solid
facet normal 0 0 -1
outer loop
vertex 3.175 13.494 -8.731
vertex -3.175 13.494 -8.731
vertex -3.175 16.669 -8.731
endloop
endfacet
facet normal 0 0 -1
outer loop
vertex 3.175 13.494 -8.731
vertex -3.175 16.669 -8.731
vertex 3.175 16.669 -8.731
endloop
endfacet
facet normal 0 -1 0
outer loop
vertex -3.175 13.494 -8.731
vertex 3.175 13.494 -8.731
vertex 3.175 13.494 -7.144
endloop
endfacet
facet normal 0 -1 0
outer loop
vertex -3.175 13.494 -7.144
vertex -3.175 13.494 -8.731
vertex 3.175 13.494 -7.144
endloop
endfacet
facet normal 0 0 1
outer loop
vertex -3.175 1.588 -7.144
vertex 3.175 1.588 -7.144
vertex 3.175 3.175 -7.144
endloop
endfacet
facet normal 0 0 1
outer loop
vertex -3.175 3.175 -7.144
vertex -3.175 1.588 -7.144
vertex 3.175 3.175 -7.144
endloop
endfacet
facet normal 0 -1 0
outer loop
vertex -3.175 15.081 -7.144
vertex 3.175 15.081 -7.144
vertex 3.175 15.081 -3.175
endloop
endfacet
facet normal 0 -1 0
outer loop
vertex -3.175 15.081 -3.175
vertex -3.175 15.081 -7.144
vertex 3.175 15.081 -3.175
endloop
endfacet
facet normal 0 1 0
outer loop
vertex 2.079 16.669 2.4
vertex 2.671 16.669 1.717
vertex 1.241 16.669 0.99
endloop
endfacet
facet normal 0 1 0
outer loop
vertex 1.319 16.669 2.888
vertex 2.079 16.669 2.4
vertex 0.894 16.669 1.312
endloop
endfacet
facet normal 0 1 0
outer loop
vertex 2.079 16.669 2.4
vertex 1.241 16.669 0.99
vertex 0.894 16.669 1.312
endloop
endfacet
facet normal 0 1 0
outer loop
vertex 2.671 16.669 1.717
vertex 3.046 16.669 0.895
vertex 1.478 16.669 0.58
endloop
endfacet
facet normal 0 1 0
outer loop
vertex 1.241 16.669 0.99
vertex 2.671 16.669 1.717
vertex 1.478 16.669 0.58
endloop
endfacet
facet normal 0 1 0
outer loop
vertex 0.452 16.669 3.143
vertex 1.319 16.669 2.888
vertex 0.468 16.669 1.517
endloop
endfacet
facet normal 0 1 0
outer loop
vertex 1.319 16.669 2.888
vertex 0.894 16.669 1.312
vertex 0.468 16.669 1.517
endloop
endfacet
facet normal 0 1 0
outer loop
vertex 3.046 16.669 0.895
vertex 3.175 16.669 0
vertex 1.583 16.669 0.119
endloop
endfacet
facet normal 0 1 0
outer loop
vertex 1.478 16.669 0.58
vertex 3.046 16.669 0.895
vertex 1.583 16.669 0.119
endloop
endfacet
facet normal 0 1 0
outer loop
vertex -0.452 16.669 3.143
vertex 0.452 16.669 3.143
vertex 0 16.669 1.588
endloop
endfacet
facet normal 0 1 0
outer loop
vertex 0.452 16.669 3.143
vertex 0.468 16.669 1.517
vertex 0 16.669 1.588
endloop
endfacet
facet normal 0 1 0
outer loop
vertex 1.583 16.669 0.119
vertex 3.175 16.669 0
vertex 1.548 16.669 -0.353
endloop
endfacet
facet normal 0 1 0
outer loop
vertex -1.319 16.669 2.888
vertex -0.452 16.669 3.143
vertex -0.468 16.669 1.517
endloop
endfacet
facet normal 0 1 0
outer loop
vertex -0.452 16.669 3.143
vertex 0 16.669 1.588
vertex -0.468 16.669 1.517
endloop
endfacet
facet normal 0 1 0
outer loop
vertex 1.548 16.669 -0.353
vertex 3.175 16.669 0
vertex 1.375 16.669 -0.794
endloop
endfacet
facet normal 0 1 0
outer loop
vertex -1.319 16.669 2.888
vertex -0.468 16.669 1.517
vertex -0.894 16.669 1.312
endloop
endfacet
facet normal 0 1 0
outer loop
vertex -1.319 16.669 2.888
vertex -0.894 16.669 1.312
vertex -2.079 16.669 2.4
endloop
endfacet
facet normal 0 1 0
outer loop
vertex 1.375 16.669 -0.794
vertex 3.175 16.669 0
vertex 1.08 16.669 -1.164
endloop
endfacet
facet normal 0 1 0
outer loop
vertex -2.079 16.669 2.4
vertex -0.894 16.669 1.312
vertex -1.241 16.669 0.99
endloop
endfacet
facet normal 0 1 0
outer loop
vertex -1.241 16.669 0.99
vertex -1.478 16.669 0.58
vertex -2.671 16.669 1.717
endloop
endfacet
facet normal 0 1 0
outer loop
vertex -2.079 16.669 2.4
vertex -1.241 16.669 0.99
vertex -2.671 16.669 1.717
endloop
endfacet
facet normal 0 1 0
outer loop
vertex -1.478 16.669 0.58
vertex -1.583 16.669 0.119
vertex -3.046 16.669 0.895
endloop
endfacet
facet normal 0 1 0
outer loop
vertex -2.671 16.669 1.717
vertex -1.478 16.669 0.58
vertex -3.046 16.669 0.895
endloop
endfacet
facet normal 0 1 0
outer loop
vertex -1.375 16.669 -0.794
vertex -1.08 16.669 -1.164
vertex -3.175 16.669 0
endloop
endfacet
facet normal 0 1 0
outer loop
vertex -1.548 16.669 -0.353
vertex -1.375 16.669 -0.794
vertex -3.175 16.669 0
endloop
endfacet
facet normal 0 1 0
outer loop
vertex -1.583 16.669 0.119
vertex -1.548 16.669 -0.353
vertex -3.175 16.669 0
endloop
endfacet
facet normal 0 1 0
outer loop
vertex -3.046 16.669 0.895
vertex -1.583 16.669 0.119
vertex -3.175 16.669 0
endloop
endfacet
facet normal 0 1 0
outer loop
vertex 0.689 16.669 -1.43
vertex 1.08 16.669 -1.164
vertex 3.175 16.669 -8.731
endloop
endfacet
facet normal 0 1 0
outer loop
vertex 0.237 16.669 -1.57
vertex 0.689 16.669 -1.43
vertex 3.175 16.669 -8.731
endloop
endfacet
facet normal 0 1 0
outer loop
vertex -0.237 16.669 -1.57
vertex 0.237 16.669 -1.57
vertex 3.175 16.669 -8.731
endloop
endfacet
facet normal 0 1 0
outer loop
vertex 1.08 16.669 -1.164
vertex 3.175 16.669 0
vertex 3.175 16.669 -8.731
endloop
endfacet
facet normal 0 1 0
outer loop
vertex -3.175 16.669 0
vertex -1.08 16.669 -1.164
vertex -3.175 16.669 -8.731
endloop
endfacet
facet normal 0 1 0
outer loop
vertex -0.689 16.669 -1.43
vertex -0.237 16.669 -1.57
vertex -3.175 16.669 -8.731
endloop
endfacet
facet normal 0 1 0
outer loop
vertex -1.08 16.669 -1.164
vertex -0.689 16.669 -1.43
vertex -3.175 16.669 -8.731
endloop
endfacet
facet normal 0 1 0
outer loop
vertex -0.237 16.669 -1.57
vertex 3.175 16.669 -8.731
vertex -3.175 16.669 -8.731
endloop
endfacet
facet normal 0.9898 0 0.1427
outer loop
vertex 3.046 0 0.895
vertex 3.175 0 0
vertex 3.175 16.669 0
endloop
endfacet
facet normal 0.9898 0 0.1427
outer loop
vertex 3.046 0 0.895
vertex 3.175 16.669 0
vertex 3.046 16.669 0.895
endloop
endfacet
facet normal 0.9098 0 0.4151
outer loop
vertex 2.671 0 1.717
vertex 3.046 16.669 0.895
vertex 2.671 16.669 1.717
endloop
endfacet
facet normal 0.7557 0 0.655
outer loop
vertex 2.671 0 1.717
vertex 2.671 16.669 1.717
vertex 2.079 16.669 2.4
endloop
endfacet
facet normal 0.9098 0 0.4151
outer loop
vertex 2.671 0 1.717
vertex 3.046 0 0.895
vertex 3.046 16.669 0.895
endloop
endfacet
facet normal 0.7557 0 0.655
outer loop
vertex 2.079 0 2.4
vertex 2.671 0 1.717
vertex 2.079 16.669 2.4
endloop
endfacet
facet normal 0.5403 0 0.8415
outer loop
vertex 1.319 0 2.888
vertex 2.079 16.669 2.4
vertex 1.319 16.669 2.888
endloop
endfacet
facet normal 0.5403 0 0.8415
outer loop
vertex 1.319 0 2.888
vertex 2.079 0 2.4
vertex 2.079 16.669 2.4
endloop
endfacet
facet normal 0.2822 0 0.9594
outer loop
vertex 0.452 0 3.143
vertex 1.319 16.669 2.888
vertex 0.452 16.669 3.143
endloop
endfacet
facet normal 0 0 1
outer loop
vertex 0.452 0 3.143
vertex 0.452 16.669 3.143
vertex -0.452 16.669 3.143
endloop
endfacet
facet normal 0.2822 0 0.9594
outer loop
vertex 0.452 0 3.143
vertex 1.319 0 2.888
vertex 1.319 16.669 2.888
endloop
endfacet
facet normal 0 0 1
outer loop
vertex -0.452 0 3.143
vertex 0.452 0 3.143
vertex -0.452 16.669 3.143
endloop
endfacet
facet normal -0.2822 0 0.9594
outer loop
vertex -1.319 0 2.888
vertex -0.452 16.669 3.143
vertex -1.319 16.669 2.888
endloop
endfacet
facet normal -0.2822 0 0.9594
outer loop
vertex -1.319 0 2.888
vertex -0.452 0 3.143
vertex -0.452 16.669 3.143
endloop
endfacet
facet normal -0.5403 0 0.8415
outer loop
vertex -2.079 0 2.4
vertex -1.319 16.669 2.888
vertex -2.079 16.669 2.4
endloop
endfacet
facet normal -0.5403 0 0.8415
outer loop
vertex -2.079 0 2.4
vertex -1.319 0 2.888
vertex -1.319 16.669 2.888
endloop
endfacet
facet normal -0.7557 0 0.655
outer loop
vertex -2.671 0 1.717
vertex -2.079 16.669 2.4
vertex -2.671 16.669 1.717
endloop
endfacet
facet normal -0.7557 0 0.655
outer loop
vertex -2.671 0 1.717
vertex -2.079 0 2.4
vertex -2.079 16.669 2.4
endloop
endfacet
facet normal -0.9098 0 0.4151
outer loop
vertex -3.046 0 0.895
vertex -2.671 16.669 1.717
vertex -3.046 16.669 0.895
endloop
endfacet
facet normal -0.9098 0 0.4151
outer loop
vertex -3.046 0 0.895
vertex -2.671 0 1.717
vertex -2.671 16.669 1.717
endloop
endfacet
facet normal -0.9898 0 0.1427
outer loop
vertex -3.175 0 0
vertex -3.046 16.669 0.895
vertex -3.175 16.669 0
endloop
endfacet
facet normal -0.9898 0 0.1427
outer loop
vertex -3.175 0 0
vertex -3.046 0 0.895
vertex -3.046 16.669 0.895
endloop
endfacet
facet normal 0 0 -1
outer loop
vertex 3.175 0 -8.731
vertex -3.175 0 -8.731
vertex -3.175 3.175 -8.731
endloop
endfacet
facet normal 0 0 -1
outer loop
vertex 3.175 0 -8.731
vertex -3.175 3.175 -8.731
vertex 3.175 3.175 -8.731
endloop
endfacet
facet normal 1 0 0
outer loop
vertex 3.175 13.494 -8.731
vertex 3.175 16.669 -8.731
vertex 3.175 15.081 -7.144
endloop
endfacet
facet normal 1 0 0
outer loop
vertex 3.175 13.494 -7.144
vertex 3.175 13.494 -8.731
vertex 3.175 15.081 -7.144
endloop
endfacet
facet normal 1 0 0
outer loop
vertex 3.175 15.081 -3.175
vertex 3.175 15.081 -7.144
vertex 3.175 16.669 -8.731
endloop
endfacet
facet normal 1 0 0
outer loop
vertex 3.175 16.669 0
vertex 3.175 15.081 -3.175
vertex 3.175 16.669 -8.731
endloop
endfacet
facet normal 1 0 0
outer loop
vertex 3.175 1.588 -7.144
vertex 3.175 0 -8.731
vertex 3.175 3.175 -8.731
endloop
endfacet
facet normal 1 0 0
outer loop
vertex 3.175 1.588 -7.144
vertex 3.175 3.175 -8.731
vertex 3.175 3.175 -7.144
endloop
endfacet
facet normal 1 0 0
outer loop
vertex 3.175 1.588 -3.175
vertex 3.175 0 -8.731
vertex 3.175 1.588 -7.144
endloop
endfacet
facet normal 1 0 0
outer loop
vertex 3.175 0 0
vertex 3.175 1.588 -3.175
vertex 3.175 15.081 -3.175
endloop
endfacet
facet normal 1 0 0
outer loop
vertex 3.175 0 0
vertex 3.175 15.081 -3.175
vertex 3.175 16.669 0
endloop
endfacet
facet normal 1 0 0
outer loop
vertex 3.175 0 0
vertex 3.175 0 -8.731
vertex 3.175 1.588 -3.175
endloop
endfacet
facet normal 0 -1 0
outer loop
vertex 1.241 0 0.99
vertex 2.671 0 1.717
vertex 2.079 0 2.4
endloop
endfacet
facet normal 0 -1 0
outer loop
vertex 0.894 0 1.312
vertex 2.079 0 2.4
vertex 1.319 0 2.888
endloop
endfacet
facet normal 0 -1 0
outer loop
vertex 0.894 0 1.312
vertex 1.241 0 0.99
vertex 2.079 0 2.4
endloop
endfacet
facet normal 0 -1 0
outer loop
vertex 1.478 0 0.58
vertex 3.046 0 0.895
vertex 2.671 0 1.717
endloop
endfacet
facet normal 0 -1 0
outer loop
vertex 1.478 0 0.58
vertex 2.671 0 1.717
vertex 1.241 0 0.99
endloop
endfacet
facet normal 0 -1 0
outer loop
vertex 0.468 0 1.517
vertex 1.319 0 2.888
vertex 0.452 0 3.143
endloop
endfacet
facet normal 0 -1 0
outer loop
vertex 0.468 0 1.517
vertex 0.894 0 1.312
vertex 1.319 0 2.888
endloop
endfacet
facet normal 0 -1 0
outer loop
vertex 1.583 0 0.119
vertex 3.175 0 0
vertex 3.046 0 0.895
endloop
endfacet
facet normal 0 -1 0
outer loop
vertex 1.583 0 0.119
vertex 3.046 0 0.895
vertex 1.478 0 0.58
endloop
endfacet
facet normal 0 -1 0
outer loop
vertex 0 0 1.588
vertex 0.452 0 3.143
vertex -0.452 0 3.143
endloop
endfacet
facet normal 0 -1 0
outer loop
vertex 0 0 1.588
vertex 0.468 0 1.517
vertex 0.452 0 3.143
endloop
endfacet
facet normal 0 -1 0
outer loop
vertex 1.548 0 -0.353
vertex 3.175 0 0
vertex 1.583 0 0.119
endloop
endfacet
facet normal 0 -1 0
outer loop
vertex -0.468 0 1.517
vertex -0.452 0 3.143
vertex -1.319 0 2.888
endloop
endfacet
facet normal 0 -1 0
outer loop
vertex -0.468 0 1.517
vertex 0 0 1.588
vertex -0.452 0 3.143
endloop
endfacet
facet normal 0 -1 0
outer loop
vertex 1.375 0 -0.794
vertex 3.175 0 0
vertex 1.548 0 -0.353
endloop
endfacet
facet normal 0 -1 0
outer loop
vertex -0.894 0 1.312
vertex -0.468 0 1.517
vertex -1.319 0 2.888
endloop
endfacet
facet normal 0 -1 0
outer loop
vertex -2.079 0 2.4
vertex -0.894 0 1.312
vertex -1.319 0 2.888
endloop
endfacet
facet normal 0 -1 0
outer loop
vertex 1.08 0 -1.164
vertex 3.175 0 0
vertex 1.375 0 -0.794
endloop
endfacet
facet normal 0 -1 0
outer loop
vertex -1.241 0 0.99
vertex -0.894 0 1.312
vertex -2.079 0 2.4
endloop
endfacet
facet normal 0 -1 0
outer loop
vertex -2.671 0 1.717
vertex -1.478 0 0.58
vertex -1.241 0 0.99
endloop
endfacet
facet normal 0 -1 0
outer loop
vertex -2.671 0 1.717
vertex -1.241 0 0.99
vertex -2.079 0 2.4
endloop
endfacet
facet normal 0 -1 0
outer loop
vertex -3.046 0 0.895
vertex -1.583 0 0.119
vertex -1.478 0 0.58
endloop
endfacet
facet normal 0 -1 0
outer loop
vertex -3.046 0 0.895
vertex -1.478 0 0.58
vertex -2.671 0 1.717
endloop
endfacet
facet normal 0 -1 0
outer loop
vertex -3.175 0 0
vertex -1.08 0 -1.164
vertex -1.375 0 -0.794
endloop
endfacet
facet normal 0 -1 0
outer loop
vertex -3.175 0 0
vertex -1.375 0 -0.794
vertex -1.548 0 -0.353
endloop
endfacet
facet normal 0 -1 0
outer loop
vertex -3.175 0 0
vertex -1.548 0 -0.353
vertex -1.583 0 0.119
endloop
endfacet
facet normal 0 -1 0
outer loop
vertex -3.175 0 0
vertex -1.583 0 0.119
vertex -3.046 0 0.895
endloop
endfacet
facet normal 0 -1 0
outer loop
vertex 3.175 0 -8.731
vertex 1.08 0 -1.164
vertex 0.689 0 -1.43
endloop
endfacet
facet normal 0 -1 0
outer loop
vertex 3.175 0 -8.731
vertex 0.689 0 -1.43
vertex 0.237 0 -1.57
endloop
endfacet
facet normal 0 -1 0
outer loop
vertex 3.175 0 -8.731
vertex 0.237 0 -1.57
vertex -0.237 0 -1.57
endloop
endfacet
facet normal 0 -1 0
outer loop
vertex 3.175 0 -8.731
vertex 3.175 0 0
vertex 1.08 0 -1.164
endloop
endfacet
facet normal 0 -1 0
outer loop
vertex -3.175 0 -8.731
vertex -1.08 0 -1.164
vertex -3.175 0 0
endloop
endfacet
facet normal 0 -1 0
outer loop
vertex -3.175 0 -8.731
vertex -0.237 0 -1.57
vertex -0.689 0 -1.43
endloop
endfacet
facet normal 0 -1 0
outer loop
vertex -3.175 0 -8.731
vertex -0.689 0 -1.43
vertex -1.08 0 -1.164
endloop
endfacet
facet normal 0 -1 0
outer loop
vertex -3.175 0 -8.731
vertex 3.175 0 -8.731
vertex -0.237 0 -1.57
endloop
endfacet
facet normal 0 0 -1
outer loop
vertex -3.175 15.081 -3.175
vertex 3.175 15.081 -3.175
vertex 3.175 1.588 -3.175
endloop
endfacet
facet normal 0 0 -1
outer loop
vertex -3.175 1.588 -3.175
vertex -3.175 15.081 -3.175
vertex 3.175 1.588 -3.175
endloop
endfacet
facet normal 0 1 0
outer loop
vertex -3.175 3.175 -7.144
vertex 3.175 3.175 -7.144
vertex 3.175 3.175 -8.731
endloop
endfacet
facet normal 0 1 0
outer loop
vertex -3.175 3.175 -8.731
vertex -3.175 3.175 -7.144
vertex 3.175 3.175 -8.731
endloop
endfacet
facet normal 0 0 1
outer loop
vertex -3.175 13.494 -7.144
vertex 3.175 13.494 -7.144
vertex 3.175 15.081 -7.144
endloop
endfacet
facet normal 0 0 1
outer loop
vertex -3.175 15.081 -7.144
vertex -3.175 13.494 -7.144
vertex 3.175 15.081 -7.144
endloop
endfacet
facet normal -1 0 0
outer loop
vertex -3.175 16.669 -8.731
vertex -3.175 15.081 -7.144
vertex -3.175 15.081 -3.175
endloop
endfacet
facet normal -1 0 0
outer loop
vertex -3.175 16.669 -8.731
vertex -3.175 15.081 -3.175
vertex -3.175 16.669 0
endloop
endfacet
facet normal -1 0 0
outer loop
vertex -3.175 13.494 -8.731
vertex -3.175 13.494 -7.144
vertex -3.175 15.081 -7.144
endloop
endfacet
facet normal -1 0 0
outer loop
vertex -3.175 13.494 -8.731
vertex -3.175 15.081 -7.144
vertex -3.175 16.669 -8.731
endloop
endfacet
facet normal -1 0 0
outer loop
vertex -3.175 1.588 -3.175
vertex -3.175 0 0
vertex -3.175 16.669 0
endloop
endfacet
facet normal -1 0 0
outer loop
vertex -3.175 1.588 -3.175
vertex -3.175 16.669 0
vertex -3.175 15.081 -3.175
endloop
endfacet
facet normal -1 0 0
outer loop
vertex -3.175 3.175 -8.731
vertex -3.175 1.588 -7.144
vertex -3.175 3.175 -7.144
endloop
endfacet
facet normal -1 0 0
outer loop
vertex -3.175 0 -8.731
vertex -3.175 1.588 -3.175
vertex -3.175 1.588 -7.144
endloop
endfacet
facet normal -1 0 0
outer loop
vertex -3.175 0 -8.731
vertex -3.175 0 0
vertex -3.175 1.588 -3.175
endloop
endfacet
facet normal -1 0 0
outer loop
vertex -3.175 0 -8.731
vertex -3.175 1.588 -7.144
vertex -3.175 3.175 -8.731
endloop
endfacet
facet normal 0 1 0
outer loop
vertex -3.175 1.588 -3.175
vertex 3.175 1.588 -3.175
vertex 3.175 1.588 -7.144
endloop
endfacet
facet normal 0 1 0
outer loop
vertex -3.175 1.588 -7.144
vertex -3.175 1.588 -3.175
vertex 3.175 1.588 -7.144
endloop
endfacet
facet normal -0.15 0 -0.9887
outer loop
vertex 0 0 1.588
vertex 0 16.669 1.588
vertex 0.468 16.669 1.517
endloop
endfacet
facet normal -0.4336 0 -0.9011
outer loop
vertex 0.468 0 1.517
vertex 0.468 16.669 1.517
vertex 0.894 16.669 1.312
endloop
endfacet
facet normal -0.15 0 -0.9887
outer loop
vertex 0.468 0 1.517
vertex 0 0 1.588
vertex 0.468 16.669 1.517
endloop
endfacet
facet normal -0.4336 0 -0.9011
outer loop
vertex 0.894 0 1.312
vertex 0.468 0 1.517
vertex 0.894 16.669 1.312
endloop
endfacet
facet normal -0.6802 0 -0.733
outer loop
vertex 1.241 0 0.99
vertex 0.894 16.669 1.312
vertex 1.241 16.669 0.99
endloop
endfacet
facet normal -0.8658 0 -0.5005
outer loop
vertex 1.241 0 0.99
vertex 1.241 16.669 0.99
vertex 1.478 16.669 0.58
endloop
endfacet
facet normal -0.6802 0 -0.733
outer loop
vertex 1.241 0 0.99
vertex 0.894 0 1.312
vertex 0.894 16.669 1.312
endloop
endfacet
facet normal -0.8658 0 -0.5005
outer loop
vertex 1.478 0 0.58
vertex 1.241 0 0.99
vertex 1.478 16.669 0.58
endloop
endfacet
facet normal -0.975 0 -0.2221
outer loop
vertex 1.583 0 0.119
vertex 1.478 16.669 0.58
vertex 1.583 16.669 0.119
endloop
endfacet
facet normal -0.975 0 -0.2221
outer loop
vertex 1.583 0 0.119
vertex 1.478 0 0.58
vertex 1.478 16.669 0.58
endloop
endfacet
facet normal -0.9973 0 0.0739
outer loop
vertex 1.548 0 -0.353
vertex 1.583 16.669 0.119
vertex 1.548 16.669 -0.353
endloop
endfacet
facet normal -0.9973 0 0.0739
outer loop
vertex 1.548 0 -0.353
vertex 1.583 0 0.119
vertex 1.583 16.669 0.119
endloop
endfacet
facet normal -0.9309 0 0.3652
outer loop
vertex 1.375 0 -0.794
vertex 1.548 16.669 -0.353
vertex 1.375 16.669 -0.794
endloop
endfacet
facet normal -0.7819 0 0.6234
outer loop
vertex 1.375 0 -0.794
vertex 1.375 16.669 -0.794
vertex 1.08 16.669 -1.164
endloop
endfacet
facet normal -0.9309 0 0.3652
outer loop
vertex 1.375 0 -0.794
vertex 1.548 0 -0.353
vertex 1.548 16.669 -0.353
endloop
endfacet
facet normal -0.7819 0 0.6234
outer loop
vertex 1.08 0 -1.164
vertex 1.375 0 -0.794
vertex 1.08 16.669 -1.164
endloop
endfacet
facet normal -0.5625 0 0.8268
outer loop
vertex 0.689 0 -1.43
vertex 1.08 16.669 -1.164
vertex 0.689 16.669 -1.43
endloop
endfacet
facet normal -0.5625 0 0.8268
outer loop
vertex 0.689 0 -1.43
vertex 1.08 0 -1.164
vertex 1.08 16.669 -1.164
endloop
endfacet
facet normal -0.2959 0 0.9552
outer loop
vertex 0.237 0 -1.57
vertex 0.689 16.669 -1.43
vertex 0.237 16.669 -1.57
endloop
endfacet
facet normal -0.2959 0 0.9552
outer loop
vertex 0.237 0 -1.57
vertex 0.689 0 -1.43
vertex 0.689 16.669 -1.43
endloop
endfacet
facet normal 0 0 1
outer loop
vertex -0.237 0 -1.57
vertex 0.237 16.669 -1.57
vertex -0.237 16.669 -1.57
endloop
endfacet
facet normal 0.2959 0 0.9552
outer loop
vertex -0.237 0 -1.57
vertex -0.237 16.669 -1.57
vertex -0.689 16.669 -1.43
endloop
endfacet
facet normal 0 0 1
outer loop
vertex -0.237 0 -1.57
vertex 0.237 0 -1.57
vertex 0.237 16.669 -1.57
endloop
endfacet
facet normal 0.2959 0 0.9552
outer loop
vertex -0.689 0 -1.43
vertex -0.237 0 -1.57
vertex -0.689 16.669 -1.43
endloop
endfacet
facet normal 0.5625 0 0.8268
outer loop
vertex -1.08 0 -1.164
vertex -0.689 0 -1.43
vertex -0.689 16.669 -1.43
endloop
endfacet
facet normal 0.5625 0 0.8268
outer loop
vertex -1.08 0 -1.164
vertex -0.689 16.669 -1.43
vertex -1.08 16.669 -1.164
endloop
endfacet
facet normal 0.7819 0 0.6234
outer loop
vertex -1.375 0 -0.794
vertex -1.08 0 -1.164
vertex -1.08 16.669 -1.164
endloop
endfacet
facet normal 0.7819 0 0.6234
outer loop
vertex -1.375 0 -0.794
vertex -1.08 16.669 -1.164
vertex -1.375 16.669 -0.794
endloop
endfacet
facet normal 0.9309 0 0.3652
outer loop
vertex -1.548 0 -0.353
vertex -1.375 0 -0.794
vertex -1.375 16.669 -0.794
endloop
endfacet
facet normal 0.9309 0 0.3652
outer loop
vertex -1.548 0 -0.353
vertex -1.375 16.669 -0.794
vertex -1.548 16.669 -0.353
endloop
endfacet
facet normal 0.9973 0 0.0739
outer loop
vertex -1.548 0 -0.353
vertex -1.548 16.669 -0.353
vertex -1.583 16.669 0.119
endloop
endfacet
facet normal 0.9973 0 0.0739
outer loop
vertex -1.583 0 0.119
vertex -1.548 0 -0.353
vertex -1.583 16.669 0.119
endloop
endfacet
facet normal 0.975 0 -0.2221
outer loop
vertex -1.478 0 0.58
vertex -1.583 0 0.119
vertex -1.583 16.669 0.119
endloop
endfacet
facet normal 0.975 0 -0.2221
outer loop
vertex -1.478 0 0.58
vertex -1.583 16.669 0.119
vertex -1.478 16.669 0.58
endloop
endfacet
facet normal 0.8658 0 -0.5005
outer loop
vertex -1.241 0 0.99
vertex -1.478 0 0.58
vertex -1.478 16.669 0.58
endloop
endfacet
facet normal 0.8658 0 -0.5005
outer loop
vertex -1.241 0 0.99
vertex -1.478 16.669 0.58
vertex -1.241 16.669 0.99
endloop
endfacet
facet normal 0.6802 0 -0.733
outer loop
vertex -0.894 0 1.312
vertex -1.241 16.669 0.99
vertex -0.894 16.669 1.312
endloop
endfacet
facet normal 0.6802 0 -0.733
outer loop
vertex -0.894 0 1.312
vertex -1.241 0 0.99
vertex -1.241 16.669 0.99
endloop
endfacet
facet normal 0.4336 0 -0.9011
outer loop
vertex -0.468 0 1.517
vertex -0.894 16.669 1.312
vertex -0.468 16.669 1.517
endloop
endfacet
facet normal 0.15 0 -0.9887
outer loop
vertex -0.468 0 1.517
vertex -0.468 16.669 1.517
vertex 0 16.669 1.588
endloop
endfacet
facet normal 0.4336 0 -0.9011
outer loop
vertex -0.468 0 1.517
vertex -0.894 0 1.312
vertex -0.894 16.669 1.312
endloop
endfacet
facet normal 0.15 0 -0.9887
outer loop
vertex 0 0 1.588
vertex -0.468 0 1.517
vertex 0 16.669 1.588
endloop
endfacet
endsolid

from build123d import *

# Parameters (mm, degrees)
SKETCH1_R           = 1.5875
BOSS_EXTRUDE1_DEPTH = 16.66875
CUT_EXTRUDE1_DEPTH  = 20.859618655


with BuildPart() as part:
    # Sketch1 → Boss-Extrude1 (new body)
    with BuildSketch(Plane(origin=(0, 0, 0), x_dir=(1, 0, 0), z_dir=(0, 1, 0))):
        with BuildLine():
            Line((-3.175, 0), (-3.175, 8.73125))
            Line((-3.175, 8.73125), (3.175, 8.73125))
            Line((3.175, 8.73125), (3.175, 0))
            ThreePointArc((3.175, 0), (0, -3.175), (-3.175, 0))
        make_face()
        with Locations(Location((0, 0, 0), (0, 0, 270))):
            Circle(SKETCH1_R, mode=Mode.SUBTRACT)
    extrude(amount=BOSS_EXTRUDE1_DEPTH)

    # Sketch3 → Cut-Extrude1 (cut, through all)
    with BuildSketch(Plane(origin=(3.175, 0, 0), x_dir=(0, 0, -1), z_dir=(1, 0, 0))):
        Polygon((8.73125, 13.49375), (7.14375, 13.49375), (7.14375, 15.08125), (3.175, 15.08125), (3.175, 1.5875), (7.14375, 1.5875), (7.14375, 3.175), (8.73125, 3.175), align=None)
    extrude(amount=-CUT_EXTRUDE1_DEPTH, mode=Mode.SUBTRACT)


solid = part.part
